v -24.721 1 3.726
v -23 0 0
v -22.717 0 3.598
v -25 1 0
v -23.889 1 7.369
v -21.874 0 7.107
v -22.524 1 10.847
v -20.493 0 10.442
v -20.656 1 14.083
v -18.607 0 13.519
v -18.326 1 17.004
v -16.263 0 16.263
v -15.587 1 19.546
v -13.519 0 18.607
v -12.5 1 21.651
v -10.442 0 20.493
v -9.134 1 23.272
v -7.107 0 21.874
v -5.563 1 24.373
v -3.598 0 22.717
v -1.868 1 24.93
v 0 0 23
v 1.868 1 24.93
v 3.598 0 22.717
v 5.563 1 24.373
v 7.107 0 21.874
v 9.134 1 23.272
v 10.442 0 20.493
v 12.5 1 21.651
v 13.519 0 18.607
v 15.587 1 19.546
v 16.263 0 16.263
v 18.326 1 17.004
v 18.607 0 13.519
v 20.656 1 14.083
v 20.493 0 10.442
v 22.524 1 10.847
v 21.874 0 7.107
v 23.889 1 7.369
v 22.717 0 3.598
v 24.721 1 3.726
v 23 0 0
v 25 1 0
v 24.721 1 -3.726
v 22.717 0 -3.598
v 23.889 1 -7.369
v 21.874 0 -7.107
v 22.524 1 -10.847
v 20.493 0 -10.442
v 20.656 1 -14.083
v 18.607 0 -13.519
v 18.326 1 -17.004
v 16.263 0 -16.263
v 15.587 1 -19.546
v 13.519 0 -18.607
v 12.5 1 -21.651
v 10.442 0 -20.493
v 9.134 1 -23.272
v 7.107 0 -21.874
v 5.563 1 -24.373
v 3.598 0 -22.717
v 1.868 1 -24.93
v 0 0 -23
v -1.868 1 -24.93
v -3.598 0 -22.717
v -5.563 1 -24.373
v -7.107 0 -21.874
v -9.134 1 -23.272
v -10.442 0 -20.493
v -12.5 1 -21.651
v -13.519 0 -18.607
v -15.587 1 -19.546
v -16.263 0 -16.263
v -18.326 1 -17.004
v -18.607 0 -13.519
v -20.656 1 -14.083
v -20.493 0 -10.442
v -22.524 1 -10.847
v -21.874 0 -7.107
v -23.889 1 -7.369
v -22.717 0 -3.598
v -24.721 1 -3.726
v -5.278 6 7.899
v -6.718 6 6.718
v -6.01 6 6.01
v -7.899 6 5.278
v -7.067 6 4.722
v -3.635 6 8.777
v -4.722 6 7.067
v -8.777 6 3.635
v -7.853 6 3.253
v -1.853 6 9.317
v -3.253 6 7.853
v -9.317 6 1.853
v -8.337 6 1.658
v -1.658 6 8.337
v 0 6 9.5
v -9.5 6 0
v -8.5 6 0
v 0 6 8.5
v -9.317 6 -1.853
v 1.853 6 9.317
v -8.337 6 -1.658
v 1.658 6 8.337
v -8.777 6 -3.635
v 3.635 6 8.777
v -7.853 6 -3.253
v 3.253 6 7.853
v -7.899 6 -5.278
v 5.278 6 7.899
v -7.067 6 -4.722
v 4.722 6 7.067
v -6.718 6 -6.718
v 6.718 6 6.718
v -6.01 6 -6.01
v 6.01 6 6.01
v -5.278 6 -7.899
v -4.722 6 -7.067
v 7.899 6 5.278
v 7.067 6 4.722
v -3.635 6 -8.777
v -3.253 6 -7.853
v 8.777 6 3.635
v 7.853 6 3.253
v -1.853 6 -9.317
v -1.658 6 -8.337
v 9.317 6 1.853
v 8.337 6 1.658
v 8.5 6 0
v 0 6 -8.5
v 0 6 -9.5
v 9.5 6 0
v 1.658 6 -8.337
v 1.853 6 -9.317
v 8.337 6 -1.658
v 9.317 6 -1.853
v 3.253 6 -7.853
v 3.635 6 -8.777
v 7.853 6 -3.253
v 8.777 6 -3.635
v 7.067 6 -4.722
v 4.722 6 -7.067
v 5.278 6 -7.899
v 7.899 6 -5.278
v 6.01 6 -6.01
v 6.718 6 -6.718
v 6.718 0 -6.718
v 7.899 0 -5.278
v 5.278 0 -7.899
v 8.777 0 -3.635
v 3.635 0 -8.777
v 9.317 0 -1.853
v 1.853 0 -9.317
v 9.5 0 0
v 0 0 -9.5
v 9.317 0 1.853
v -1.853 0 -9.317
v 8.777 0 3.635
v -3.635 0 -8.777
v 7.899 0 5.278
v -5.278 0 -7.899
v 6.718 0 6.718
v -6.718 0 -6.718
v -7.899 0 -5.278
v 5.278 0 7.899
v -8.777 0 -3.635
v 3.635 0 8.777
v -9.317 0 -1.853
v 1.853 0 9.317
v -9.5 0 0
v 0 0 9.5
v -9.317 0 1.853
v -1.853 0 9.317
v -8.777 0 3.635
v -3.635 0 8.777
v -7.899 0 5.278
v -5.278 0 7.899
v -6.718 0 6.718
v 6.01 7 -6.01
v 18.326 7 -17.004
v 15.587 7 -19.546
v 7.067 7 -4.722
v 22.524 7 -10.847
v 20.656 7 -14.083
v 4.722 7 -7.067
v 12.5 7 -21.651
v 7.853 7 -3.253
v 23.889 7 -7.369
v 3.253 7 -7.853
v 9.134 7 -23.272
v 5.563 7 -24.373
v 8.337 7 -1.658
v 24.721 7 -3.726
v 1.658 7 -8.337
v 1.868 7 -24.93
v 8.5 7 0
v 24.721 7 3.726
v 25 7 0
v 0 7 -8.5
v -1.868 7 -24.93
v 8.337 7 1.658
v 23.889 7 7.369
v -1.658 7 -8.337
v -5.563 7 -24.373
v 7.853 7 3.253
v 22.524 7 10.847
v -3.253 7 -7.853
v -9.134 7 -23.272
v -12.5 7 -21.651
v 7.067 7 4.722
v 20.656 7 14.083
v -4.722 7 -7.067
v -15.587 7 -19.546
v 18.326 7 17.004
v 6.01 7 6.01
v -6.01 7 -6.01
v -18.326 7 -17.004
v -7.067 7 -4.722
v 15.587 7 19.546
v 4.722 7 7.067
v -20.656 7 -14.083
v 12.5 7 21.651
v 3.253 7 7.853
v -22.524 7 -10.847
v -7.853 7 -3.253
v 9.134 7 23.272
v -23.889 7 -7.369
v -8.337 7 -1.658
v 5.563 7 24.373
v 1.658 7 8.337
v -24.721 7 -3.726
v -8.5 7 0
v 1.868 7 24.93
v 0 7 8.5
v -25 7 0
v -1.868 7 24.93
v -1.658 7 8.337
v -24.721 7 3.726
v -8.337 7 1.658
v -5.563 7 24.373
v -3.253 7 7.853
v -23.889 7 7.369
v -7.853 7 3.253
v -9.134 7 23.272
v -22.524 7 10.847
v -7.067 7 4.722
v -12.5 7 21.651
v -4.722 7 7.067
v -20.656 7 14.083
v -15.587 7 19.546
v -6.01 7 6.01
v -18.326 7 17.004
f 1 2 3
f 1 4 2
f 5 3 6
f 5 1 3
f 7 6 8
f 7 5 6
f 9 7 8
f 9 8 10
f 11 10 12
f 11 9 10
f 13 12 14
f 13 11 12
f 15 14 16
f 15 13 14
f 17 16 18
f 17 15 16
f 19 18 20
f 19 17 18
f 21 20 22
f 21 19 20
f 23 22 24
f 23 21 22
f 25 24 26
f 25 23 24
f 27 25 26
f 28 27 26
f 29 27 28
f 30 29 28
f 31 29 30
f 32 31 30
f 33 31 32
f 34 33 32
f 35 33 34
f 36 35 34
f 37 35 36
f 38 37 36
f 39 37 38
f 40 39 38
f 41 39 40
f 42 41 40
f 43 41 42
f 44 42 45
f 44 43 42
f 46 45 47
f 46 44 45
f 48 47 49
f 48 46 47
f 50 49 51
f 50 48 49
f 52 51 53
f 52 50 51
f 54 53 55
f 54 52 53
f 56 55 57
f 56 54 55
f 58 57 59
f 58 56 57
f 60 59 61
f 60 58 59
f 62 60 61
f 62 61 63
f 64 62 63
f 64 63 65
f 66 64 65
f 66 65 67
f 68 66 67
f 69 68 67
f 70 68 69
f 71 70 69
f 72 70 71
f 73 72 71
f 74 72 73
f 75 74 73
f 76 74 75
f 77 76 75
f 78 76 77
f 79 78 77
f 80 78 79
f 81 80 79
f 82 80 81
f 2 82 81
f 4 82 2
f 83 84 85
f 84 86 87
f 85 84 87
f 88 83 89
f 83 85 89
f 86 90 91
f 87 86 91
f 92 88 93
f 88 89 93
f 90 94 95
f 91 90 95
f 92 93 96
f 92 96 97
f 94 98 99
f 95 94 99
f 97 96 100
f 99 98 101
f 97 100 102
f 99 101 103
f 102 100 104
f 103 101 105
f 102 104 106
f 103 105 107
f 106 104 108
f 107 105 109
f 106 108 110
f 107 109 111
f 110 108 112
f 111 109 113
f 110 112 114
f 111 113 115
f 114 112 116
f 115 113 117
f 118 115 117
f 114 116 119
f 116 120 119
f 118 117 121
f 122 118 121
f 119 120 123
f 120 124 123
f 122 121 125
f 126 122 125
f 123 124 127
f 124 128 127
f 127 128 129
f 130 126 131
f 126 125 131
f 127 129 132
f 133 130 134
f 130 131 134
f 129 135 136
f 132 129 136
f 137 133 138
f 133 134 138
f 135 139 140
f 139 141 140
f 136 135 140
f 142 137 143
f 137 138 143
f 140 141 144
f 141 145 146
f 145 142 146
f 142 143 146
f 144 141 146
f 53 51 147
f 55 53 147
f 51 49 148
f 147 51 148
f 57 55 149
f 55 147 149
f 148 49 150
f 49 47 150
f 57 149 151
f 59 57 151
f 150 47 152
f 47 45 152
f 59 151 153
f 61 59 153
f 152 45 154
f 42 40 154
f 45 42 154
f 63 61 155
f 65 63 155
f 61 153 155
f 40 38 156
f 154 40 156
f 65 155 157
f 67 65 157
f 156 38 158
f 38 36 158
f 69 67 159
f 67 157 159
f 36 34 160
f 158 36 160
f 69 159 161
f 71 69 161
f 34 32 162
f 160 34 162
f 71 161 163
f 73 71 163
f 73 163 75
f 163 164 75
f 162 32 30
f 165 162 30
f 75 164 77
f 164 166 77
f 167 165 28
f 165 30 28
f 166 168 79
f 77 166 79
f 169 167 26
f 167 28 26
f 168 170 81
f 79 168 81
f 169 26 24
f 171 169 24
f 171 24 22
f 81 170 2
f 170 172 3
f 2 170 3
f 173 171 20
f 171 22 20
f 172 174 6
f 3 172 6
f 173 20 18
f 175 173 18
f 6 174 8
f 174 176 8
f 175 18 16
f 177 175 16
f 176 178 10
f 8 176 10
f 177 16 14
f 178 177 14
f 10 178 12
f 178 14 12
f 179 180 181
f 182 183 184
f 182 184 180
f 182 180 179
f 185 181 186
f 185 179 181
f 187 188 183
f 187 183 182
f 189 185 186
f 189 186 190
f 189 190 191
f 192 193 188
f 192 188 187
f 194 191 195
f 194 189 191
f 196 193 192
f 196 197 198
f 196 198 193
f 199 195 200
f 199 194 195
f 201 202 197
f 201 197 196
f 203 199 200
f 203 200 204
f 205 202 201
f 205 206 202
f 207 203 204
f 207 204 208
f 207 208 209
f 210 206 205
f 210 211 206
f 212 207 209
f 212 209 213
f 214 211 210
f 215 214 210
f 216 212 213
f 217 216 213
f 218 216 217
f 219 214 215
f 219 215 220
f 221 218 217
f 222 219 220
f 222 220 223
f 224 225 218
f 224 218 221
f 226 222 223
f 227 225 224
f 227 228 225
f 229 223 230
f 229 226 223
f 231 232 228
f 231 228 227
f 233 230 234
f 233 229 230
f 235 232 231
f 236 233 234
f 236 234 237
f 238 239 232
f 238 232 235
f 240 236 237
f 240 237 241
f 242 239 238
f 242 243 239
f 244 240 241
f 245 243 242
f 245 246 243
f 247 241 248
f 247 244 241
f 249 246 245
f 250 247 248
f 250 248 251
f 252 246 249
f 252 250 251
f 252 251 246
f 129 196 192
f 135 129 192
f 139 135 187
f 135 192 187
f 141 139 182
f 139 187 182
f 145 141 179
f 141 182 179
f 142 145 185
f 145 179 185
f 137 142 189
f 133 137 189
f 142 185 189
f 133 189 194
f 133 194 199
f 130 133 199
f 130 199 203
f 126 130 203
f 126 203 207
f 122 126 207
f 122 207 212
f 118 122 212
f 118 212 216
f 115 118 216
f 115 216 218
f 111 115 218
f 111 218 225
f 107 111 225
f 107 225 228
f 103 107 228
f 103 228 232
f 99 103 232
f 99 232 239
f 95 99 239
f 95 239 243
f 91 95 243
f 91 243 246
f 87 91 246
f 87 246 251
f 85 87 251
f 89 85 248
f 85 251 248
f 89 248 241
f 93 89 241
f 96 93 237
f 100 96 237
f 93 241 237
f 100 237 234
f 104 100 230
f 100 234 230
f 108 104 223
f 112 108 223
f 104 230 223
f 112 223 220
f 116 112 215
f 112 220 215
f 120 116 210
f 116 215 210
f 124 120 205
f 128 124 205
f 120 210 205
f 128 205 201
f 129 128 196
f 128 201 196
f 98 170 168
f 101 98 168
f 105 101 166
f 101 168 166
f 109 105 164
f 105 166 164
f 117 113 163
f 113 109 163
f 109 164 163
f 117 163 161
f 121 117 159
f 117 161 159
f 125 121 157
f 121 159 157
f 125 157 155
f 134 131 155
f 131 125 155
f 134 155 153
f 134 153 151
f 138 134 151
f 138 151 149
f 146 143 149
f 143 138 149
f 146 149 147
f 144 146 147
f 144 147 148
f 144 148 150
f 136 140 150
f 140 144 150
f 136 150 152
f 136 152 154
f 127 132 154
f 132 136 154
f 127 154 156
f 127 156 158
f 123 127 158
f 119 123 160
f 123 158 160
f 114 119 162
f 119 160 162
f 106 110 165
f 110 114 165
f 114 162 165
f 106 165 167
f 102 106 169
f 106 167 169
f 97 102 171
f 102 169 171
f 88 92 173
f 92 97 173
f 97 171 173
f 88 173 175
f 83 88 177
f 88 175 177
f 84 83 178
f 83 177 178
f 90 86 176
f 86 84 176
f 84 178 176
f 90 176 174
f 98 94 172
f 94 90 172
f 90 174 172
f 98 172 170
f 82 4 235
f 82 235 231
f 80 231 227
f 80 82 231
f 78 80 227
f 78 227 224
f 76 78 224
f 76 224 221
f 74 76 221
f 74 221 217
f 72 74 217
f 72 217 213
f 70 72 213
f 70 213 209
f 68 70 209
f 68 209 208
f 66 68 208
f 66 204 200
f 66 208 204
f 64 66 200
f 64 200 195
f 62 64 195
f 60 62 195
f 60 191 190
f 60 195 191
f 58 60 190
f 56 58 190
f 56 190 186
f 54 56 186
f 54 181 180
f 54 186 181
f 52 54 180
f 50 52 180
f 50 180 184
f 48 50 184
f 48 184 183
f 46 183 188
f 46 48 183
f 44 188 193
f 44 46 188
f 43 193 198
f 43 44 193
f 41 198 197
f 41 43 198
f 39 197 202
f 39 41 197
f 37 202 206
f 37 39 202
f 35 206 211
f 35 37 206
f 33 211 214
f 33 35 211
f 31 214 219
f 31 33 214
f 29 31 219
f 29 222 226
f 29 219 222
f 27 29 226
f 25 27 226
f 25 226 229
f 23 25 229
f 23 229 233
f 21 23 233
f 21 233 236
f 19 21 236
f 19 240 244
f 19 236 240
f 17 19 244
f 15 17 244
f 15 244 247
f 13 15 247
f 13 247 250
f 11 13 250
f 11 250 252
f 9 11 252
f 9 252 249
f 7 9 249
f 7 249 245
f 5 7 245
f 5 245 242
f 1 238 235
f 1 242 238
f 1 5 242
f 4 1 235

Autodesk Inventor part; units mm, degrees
ref_plane "YZ Plane" through (0, 0, 0) normal (1, 0, 0) x (0, 1, 0)
ref_plane "XZ Plane" through (0, 0, 0) normal (0, 1, 0) x (-1, 0, 0)
ref_plane "XY Plane" through (0, 0, 0) normal (0, 0, 1) x (1, 0, 0)
sketch "Szkic1" plane through (0, 0, 0) normal (0, 1, 0) x (-1, 0, 0)
  circle A0 centre (0, 0) radius 9.5
  circle A1 centre (0, 0) radius 25
  dimension "d0" = 19
  dimension "d3" = 50
extrude "Wyciągnięcie proste1" add sketch "Szkic1" along normal blind 7
sketch "Szkic2" plane through (0, 7, 0) normal (0, 1, 0) x (1, 0, 0)
  circle A0 centre (0, 0) radius 9.5
  circle A1 centre (0, 0) radius 8.5
  dimension "d4" = 19
  dimension "d5" = 17
extrude "Wyciągnięcie proste2" add sketch "Szkic2" against normal blind 1
chamfer "Faza1" distance 1 distance2 2 1 edges at (25, 0, 0) measured on face at (-24.9189, 4.6667, -2.0117)
properties part number "opona_nosne" material "Aluminum 6061"
